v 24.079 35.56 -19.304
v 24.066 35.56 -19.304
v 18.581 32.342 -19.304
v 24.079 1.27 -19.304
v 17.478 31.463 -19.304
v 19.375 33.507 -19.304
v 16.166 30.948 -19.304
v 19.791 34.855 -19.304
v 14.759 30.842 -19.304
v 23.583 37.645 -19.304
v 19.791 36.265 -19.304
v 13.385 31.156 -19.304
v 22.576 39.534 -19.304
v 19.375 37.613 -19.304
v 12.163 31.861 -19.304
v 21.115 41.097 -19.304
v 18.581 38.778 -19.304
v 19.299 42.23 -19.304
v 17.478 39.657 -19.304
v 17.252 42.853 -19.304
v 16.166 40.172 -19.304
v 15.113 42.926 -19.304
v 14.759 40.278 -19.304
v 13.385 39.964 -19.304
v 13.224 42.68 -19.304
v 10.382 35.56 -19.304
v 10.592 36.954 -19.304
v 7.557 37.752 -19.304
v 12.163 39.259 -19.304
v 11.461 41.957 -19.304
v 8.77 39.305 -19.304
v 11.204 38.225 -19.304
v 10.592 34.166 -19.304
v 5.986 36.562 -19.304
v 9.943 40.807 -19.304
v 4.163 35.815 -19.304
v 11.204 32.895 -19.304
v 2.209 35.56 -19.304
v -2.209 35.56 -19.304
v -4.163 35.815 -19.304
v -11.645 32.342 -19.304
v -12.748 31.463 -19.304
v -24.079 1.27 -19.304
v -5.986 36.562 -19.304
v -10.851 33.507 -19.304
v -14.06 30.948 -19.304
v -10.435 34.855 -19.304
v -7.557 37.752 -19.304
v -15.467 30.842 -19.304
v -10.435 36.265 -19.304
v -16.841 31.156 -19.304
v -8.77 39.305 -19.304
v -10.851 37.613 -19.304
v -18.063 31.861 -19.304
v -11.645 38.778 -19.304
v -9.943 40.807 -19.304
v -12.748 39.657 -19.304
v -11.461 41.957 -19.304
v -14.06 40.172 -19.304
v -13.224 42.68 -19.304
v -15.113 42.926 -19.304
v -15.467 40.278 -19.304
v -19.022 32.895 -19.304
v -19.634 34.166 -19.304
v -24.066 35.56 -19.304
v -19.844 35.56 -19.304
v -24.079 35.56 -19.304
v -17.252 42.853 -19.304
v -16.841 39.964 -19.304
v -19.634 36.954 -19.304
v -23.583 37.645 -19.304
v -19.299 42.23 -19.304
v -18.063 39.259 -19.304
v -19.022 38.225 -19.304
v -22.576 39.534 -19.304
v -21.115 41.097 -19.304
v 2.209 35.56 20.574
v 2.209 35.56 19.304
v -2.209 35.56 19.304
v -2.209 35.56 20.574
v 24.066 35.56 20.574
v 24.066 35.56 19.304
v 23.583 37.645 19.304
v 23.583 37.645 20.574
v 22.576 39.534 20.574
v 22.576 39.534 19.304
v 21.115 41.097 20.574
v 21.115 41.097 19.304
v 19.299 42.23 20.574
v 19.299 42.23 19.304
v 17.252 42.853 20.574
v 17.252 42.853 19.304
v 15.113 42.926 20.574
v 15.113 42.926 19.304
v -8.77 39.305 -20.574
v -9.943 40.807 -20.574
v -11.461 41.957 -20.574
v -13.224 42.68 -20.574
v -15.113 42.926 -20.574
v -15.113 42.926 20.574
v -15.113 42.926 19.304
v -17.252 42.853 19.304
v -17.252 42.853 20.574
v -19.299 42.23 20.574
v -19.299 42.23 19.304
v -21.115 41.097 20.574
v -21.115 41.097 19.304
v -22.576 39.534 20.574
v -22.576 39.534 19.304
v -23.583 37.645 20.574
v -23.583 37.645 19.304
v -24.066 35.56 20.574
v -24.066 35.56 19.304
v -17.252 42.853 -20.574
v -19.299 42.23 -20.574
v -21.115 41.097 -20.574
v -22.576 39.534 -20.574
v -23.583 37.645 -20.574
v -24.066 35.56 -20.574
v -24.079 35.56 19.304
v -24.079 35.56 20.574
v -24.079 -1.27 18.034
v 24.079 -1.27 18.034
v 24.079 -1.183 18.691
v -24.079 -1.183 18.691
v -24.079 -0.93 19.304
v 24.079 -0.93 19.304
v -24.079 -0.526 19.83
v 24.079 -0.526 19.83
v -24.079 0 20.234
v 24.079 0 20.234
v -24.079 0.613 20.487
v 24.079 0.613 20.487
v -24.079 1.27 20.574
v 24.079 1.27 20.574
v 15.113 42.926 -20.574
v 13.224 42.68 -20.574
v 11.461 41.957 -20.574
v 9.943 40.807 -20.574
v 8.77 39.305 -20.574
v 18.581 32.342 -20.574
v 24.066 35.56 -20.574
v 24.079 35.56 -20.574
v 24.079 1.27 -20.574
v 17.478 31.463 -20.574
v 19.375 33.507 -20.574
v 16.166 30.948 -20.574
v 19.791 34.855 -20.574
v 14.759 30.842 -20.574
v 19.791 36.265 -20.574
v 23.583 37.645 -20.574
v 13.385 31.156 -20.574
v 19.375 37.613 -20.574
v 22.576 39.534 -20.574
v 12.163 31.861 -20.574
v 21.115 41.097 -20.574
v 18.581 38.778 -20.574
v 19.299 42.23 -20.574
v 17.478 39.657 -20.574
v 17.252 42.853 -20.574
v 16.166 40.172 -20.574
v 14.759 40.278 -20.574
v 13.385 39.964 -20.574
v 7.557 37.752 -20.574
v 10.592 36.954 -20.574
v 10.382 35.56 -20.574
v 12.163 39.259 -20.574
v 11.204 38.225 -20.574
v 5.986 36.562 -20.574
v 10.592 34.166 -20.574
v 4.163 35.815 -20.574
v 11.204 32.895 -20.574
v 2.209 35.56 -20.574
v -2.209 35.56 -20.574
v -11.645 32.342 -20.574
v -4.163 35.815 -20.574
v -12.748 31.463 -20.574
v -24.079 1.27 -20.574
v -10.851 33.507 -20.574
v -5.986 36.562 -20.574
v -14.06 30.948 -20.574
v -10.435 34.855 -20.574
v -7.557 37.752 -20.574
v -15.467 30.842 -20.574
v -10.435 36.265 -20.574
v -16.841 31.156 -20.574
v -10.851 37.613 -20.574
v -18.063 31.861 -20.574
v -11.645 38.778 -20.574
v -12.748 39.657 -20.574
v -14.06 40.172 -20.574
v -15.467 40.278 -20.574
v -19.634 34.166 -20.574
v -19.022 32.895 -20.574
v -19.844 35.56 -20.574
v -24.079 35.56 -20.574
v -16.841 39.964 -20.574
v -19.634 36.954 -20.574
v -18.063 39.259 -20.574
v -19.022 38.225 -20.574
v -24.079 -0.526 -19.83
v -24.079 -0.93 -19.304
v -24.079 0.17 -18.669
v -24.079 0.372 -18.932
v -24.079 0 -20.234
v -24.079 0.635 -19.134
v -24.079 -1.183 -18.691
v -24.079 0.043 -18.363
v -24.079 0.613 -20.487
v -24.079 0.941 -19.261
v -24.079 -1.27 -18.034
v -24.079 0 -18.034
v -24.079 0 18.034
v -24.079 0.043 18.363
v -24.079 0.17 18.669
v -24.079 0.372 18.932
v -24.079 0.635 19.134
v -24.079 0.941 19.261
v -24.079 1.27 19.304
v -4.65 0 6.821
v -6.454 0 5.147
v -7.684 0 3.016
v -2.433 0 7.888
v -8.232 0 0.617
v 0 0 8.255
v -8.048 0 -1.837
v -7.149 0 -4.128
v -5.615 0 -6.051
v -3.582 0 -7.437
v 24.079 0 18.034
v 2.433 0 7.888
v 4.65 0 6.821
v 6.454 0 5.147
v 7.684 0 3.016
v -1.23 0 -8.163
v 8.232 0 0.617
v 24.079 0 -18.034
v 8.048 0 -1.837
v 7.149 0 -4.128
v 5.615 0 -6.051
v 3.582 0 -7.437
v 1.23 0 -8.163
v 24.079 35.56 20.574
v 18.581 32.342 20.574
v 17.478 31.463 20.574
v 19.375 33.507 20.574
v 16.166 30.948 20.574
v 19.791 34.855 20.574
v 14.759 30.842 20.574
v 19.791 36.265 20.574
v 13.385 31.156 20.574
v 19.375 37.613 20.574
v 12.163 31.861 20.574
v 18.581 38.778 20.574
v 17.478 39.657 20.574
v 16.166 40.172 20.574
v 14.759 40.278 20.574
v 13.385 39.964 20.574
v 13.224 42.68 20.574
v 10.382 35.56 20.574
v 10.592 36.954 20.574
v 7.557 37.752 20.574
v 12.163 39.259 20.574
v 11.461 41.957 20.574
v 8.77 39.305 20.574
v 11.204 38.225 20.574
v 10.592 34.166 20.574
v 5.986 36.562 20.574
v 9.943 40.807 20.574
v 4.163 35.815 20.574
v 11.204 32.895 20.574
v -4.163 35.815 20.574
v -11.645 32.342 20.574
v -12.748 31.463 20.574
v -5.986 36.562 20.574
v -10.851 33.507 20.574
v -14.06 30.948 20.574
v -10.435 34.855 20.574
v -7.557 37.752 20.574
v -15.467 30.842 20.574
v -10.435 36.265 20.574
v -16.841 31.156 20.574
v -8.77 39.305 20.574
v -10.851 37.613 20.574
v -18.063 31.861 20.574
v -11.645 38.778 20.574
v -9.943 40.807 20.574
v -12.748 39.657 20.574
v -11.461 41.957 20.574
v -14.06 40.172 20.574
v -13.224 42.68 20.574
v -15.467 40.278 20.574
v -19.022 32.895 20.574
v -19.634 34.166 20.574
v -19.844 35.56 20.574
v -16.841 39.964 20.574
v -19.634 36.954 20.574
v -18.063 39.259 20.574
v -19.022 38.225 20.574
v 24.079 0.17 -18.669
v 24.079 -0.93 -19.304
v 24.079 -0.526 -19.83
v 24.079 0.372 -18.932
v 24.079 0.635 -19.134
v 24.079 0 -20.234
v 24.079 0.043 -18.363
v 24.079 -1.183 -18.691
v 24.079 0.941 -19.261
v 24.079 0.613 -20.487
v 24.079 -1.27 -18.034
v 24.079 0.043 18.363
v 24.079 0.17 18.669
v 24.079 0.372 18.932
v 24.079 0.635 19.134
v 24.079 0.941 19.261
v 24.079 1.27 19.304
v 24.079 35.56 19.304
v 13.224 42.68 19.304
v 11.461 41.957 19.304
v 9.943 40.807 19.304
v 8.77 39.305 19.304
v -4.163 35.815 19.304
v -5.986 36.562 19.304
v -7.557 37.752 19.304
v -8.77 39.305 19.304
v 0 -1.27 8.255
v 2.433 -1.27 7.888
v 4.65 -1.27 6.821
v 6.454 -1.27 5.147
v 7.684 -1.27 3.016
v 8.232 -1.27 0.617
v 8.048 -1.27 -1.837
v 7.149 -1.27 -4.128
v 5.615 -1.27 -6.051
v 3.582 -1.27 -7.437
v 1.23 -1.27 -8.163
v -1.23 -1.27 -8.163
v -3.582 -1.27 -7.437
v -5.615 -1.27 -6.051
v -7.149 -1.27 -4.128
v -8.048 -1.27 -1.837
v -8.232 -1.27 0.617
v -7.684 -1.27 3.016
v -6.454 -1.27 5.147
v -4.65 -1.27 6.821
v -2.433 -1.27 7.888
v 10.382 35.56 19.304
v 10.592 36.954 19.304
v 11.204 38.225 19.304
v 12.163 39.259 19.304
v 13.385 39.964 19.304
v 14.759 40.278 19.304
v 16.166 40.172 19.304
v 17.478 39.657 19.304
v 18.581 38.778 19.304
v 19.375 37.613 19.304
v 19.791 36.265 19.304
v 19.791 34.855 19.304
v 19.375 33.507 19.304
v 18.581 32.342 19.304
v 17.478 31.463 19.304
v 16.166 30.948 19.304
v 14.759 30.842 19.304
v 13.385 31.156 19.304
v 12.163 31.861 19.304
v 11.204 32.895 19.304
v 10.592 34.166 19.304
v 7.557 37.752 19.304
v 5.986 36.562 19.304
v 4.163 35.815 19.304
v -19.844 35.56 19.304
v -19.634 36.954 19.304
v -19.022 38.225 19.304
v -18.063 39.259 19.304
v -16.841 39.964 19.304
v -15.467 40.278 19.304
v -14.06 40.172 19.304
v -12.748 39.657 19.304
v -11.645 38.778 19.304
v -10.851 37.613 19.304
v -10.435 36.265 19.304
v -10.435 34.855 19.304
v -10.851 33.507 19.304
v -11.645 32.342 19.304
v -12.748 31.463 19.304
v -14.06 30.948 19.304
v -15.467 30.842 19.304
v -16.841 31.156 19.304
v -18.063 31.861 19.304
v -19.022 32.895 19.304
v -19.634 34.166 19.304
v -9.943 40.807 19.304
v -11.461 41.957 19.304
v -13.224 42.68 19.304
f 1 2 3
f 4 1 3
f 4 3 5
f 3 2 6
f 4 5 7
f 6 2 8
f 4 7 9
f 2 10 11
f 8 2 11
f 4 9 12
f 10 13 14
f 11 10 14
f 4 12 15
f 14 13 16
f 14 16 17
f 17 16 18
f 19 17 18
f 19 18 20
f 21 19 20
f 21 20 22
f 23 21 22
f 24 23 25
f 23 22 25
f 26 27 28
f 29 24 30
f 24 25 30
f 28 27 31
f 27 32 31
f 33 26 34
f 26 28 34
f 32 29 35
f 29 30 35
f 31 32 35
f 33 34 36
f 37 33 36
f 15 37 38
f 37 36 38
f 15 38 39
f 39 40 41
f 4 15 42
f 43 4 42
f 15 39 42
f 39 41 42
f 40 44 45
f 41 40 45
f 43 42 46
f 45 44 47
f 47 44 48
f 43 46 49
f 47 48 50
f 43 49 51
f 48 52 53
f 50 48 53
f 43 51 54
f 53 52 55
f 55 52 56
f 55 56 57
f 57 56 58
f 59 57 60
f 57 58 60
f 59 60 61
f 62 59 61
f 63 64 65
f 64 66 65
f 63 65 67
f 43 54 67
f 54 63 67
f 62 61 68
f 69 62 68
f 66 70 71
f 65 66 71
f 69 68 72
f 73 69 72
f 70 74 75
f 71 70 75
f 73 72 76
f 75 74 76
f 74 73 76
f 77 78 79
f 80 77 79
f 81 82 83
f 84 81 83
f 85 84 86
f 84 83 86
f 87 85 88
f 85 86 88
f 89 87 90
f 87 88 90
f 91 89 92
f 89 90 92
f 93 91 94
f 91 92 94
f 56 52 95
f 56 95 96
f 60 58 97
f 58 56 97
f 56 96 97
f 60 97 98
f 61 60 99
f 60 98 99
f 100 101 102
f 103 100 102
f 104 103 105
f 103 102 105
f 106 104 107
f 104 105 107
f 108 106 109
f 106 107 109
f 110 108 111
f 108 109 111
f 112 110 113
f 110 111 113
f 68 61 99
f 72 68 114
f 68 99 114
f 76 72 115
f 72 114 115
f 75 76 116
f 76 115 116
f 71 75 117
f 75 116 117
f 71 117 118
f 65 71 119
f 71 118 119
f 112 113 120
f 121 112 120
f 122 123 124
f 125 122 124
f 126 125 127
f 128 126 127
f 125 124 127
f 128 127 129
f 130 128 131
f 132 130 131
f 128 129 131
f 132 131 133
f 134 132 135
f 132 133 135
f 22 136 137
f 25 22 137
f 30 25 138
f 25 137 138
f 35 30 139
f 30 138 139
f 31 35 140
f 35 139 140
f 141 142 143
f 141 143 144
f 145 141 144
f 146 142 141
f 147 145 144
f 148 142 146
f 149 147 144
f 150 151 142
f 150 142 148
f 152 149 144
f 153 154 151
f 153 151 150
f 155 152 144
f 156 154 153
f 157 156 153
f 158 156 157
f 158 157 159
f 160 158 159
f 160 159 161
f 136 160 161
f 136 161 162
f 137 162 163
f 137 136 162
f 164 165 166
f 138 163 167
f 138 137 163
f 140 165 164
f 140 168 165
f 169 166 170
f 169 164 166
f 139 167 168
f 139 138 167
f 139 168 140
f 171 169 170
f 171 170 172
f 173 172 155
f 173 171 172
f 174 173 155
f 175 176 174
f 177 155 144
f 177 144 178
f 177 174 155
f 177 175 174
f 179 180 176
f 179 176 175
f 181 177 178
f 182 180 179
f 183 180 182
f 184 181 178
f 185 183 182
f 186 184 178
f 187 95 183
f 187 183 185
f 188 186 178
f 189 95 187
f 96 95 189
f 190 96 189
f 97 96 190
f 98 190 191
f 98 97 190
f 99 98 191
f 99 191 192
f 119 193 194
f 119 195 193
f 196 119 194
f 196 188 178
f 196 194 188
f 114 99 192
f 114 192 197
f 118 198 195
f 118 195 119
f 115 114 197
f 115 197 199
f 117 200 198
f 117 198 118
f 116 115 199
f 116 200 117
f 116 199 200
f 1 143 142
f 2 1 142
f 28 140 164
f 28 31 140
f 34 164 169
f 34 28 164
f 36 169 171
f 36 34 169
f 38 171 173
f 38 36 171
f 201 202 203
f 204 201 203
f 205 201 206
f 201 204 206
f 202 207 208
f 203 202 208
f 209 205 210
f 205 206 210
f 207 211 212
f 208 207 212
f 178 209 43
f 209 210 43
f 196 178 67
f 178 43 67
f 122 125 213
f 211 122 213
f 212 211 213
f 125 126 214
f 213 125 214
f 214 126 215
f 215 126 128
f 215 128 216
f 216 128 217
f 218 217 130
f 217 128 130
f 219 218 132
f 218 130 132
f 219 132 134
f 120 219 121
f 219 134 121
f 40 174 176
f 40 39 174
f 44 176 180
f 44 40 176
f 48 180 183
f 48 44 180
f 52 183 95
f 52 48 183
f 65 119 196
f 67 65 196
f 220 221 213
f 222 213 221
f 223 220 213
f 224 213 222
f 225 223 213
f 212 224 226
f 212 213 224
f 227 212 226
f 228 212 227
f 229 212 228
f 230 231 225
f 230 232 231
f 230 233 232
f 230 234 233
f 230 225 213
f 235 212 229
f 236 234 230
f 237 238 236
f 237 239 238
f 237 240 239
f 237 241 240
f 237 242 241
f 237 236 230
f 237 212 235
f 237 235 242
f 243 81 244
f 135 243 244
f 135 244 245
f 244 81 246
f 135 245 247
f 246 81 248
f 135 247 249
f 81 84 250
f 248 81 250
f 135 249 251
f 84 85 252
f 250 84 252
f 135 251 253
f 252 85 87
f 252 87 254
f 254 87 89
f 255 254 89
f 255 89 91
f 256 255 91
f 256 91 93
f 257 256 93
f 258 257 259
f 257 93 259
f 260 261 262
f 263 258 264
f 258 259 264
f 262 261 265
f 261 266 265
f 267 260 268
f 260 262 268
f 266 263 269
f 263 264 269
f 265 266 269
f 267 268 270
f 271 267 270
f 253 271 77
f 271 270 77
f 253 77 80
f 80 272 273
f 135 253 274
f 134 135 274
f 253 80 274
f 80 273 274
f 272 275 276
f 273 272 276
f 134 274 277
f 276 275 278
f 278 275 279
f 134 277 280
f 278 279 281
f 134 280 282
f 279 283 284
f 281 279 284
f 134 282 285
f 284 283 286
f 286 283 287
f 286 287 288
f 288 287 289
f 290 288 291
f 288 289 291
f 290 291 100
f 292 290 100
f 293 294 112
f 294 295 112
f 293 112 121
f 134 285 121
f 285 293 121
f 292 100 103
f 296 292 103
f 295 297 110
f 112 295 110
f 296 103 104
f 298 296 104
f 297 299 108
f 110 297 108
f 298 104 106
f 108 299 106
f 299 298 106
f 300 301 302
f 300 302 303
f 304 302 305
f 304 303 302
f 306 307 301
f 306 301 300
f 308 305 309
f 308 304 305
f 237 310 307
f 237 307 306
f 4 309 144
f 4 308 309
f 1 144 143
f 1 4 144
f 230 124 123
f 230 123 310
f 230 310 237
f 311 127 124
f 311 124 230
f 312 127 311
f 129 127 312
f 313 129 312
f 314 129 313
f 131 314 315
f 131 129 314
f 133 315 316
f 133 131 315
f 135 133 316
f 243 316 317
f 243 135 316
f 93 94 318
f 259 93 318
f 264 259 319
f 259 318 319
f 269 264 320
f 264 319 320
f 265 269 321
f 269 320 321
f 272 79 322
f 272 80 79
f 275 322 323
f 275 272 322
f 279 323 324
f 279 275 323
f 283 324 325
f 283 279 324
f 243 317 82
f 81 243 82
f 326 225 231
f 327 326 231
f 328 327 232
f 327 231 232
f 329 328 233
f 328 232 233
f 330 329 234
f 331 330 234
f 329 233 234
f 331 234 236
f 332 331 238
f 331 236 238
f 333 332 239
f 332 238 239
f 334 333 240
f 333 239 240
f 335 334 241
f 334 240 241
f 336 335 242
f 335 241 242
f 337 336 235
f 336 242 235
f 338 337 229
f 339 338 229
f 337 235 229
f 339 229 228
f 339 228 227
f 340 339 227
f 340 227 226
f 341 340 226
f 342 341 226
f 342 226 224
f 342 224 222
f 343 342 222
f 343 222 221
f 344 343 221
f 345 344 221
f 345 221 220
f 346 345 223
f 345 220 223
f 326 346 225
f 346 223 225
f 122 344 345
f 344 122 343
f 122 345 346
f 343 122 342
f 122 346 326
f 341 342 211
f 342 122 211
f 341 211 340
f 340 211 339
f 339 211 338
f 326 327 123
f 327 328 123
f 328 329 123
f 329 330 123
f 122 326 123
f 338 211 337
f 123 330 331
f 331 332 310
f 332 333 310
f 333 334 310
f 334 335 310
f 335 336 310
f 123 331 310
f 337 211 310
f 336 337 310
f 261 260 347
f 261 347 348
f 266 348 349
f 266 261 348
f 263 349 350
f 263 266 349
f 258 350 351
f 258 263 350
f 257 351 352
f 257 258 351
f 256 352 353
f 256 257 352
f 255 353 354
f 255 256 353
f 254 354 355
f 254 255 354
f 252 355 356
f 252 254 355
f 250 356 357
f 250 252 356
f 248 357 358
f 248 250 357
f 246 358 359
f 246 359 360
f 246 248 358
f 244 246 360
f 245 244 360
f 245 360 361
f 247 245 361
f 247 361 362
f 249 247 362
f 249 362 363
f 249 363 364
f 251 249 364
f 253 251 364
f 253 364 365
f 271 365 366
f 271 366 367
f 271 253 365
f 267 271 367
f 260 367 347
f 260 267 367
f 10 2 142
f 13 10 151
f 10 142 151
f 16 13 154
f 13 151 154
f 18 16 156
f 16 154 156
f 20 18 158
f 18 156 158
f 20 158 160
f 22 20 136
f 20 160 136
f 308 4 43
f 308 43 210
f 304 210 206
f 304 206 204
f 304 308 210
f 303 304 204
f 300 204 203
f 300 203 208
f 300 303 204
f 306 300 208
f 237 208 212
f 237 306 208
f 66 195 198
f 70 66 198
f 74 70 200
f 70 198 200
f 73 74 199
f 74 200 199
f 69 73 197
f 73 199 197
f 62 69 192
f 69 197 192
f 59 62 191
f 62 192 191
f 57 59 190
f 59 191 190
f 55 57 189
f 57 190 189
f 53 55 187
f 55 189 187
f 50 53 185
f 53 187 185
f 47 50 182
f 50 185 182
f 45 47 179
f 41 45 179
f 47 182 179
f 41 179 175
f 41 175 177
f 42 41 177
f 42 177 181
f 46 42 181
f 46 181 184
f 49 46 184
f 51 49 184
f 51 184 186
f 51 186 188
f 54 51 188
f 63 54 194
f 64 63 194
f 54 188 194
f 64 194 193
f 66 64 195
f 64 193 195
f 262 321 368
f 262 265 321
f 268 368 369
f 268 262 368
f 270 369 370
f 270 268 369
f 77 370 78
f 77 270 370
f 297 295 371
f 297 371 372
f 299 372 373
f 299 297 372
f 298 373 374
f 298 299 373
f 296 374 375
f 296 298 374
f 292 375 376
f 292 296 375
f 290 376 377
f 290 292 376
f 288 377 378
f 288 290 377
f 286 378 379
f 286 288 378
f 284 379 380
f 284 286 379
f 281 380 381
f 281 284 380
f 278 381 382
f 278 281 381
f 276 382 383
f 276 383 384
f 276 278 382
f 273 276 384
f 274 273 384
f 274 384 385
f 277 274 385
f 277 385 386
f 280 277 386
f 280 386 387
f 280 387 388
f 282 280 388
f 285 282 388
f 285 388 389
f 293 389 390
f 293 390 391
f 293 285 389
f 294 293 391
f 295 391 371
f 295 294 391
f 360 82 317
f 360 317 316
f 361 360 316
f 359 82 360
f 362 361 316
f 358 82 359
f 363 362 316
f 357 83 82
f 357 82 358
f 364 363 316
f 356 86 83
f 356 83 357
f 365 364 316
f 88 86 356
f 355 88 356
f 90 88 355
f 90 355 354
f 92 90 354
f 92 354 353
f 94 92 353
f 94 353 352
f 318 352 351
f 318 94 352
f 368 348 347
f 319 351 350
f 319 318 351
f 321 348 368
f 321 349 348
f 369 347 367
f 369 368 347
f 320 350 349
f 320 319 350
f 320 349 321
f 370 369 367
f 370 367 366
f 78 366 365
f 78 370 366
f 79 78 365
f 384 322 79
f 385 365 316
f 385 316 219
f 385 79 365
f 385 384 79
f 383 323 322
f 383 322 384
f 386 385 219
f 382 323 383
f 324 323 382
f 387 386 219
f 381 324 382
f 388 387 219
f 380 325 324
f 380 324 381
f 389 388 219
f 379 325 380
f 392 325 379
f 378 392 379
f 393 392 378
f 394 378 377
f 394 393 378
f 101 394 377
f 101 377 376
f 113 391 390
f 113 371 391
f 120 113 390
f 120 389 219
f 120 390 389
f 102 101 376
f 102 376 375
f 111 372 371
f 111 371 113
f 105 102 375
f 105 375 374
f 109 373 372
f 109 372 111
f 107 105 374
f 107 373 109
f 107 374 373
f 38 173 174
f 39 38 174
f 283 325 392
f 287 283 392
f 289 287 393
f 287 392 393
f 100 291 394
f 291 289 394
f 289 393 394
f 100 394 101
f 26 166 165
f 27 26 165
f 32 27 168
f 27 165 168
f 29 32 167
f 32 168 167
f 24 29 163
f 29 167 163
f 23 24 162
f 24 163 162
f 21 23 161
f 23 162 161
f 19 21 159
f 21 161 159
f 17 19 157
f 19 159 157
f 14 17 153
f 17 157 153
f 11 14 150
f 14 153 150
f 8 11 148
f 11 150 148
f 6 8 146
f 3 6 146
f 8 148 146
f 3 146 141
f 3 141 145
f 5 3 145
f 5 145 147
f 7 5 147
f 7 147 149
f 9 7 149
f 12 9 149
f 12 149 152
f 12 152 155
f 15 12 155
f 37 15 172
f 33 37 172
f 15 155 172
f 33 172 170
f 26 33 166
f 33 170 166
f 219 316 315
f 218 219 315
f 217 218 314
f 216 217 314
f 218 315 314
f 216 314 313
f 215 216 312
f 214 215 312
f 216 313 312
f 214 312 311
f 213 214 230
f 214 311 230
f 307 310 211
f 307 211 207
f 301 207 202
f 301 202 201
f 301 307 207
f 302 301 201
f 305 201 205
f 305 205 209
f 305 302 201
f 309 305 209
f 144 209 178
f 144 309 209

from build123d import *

# Parameters (mm, degrees)
SKETCH1_W               = 48.1584
SKETCH1_H               = 36.068
SKETCH1_R               = 8.255
BASE_FLANGE1_DEPTH      = 1.27
EDGE_FLANGE1_DEPTH      = 48.1584
EDGE_FLANGE1_START      = 1.27
EDGE_FLANGE1_PROFILE_W  = 48.1584
EDGE_FLANGE1_PROFILE_H  = 43.2562
EDGE_FLANGE1_PROFILE_R  = 4.73075
EDGE_FLANGE1_FLAT_DEPTH = 1.27
CUT_EXTRUDE7_DEPTH      = 66.234563408
FILLET2_R               = 7.62


# Sheet-metal steps are written as plain solids
with BuildPart() as part:
    # Sketch1 → Base-Flange1 (new body)
    with BuildSketch(Plane(origin=(0, 0, 0), x_dir=(1, 0, 0), z_dir=(0, 1, 0))):
        Rectangle(SKETCH1_W, SKETCH1_H)
        with Locations(Location((0, 0, 0), (0, 0, 270))):
            Circle(SKETCH1_R, mode=Mode.SUBTRACT)
    extrude(amount=-BASE_FLANGE1_DEPTH)

    # Edge-Flange1 bend section (across the edge) → Edge-Flange1 (add)
    with BuildSketch(Plane(origin=(24.0792, 0, -19.304), x_dir=(0, 0, 1), z_dir=(-1, 0, 0))):
        with BuildLine():
            Line((-1.27, 1.27), (0, 1.27))
            ThreePointArc((0, 1.27), (0.371974388, 0.371974388), (1.27, 0))
            Line((1.27, 0), (1.27, -1.27))
            ThreePointArc((1.27, -1.27), (-0.526051224, -0.526051224), (-1.27, 1.27))
        make_face()
    edge_flange1 = extrude(amount=EDGE_FLANGE1_DEPTH)

    # Edge-Flange1 profile (on flange) → Edge-Flange1 flat (add)
    with BuildSketch(Plane(origin=(0, 0, -19.304), x_dir=(-1, 0, 0), z_dir=(0, 0, -1)).offset(EDGE_FLANGE1_START)):
        with Locations((0, 22.8981)):
            Rectangle(EDGE_FLANGE1_PROFILE_W, EDGE_FLANGE1_PROFILE_H)
        with Locations((15.113, 35.56)):
            Circle(EDGE_FLANGE1_PROFILE_R, mode=Mode.SUBTRACT)
        with Locations((-15.113, 35.56)):
            Circle(EDGE_FLANGE1_PROFILE_R, mode=Mode.SUBTRACT)
    edge_flange1_flat = extrude(amount=-EDGE_FLANGE1_FLAT_DEPTH)

    # Mirror1: Edge-Flange1, Edge-Flange1 flat across plane
    add(edge_flange1.mirror(Plane.XY))
    add(edge_flange1_flat.mirror(Plane.XY))

    # Sketch11 → Cut-Extrude7 (cut, through all)
    with BuildSketch(Plane(origin=(0, 0, -20.574), x_dir=(-1, 0, 0), z_dir=(0, 0, -1))):
        with BuildLine():
            Line((24.0792, 35.56), (24.0792, 44.5262))
            Line((24.0792, 44.5262), (-24.0792, 44.5262))
            Line((-24.0792, 44.5262), (-24.0792, 35.56))
            Line((-24.0792, 35.56), (-24.066339002, 35.56))
            ThreePointArc((-24.066339002, 35.56), (-21.115218051, 41.097297222), (-15.113, 42.926))
            ThreePointArc((-15.113, 42.926), (-9.90445145, 40.76854855), (-7.747, 35.56))
            Line((-7.747, 35.56), (7.747, 35.56))
            ThreePointArc((7.747, 35.56), (9.90445145, 40.76854855), (15.113, 42.926))
            ThreePointArc((15.113, 42.926), (21.115218051, 41.097297222), (24.066339002, 35.56))
            Line((24.066339002, 35.56), (24.0792, 35.56))
        make_face()
    extrude(amount=-CUT_EXTRUDE7_DEPTH, mode=Mode.SUBTRACT)

    # Fillet2
    fillet2_edges = [part.edges().sort_by_distance(p)[0] for p in [
        (-7.747, 35.56, -19.939),
        (7.747, 35.56, -19.939),
        (-7.747, 35.56, 19.939),
        (7.747, 35.56, 19.939),
    ]]
    fillet(fillet2_edges, radius=FILLET2_R)


solid = part.part
